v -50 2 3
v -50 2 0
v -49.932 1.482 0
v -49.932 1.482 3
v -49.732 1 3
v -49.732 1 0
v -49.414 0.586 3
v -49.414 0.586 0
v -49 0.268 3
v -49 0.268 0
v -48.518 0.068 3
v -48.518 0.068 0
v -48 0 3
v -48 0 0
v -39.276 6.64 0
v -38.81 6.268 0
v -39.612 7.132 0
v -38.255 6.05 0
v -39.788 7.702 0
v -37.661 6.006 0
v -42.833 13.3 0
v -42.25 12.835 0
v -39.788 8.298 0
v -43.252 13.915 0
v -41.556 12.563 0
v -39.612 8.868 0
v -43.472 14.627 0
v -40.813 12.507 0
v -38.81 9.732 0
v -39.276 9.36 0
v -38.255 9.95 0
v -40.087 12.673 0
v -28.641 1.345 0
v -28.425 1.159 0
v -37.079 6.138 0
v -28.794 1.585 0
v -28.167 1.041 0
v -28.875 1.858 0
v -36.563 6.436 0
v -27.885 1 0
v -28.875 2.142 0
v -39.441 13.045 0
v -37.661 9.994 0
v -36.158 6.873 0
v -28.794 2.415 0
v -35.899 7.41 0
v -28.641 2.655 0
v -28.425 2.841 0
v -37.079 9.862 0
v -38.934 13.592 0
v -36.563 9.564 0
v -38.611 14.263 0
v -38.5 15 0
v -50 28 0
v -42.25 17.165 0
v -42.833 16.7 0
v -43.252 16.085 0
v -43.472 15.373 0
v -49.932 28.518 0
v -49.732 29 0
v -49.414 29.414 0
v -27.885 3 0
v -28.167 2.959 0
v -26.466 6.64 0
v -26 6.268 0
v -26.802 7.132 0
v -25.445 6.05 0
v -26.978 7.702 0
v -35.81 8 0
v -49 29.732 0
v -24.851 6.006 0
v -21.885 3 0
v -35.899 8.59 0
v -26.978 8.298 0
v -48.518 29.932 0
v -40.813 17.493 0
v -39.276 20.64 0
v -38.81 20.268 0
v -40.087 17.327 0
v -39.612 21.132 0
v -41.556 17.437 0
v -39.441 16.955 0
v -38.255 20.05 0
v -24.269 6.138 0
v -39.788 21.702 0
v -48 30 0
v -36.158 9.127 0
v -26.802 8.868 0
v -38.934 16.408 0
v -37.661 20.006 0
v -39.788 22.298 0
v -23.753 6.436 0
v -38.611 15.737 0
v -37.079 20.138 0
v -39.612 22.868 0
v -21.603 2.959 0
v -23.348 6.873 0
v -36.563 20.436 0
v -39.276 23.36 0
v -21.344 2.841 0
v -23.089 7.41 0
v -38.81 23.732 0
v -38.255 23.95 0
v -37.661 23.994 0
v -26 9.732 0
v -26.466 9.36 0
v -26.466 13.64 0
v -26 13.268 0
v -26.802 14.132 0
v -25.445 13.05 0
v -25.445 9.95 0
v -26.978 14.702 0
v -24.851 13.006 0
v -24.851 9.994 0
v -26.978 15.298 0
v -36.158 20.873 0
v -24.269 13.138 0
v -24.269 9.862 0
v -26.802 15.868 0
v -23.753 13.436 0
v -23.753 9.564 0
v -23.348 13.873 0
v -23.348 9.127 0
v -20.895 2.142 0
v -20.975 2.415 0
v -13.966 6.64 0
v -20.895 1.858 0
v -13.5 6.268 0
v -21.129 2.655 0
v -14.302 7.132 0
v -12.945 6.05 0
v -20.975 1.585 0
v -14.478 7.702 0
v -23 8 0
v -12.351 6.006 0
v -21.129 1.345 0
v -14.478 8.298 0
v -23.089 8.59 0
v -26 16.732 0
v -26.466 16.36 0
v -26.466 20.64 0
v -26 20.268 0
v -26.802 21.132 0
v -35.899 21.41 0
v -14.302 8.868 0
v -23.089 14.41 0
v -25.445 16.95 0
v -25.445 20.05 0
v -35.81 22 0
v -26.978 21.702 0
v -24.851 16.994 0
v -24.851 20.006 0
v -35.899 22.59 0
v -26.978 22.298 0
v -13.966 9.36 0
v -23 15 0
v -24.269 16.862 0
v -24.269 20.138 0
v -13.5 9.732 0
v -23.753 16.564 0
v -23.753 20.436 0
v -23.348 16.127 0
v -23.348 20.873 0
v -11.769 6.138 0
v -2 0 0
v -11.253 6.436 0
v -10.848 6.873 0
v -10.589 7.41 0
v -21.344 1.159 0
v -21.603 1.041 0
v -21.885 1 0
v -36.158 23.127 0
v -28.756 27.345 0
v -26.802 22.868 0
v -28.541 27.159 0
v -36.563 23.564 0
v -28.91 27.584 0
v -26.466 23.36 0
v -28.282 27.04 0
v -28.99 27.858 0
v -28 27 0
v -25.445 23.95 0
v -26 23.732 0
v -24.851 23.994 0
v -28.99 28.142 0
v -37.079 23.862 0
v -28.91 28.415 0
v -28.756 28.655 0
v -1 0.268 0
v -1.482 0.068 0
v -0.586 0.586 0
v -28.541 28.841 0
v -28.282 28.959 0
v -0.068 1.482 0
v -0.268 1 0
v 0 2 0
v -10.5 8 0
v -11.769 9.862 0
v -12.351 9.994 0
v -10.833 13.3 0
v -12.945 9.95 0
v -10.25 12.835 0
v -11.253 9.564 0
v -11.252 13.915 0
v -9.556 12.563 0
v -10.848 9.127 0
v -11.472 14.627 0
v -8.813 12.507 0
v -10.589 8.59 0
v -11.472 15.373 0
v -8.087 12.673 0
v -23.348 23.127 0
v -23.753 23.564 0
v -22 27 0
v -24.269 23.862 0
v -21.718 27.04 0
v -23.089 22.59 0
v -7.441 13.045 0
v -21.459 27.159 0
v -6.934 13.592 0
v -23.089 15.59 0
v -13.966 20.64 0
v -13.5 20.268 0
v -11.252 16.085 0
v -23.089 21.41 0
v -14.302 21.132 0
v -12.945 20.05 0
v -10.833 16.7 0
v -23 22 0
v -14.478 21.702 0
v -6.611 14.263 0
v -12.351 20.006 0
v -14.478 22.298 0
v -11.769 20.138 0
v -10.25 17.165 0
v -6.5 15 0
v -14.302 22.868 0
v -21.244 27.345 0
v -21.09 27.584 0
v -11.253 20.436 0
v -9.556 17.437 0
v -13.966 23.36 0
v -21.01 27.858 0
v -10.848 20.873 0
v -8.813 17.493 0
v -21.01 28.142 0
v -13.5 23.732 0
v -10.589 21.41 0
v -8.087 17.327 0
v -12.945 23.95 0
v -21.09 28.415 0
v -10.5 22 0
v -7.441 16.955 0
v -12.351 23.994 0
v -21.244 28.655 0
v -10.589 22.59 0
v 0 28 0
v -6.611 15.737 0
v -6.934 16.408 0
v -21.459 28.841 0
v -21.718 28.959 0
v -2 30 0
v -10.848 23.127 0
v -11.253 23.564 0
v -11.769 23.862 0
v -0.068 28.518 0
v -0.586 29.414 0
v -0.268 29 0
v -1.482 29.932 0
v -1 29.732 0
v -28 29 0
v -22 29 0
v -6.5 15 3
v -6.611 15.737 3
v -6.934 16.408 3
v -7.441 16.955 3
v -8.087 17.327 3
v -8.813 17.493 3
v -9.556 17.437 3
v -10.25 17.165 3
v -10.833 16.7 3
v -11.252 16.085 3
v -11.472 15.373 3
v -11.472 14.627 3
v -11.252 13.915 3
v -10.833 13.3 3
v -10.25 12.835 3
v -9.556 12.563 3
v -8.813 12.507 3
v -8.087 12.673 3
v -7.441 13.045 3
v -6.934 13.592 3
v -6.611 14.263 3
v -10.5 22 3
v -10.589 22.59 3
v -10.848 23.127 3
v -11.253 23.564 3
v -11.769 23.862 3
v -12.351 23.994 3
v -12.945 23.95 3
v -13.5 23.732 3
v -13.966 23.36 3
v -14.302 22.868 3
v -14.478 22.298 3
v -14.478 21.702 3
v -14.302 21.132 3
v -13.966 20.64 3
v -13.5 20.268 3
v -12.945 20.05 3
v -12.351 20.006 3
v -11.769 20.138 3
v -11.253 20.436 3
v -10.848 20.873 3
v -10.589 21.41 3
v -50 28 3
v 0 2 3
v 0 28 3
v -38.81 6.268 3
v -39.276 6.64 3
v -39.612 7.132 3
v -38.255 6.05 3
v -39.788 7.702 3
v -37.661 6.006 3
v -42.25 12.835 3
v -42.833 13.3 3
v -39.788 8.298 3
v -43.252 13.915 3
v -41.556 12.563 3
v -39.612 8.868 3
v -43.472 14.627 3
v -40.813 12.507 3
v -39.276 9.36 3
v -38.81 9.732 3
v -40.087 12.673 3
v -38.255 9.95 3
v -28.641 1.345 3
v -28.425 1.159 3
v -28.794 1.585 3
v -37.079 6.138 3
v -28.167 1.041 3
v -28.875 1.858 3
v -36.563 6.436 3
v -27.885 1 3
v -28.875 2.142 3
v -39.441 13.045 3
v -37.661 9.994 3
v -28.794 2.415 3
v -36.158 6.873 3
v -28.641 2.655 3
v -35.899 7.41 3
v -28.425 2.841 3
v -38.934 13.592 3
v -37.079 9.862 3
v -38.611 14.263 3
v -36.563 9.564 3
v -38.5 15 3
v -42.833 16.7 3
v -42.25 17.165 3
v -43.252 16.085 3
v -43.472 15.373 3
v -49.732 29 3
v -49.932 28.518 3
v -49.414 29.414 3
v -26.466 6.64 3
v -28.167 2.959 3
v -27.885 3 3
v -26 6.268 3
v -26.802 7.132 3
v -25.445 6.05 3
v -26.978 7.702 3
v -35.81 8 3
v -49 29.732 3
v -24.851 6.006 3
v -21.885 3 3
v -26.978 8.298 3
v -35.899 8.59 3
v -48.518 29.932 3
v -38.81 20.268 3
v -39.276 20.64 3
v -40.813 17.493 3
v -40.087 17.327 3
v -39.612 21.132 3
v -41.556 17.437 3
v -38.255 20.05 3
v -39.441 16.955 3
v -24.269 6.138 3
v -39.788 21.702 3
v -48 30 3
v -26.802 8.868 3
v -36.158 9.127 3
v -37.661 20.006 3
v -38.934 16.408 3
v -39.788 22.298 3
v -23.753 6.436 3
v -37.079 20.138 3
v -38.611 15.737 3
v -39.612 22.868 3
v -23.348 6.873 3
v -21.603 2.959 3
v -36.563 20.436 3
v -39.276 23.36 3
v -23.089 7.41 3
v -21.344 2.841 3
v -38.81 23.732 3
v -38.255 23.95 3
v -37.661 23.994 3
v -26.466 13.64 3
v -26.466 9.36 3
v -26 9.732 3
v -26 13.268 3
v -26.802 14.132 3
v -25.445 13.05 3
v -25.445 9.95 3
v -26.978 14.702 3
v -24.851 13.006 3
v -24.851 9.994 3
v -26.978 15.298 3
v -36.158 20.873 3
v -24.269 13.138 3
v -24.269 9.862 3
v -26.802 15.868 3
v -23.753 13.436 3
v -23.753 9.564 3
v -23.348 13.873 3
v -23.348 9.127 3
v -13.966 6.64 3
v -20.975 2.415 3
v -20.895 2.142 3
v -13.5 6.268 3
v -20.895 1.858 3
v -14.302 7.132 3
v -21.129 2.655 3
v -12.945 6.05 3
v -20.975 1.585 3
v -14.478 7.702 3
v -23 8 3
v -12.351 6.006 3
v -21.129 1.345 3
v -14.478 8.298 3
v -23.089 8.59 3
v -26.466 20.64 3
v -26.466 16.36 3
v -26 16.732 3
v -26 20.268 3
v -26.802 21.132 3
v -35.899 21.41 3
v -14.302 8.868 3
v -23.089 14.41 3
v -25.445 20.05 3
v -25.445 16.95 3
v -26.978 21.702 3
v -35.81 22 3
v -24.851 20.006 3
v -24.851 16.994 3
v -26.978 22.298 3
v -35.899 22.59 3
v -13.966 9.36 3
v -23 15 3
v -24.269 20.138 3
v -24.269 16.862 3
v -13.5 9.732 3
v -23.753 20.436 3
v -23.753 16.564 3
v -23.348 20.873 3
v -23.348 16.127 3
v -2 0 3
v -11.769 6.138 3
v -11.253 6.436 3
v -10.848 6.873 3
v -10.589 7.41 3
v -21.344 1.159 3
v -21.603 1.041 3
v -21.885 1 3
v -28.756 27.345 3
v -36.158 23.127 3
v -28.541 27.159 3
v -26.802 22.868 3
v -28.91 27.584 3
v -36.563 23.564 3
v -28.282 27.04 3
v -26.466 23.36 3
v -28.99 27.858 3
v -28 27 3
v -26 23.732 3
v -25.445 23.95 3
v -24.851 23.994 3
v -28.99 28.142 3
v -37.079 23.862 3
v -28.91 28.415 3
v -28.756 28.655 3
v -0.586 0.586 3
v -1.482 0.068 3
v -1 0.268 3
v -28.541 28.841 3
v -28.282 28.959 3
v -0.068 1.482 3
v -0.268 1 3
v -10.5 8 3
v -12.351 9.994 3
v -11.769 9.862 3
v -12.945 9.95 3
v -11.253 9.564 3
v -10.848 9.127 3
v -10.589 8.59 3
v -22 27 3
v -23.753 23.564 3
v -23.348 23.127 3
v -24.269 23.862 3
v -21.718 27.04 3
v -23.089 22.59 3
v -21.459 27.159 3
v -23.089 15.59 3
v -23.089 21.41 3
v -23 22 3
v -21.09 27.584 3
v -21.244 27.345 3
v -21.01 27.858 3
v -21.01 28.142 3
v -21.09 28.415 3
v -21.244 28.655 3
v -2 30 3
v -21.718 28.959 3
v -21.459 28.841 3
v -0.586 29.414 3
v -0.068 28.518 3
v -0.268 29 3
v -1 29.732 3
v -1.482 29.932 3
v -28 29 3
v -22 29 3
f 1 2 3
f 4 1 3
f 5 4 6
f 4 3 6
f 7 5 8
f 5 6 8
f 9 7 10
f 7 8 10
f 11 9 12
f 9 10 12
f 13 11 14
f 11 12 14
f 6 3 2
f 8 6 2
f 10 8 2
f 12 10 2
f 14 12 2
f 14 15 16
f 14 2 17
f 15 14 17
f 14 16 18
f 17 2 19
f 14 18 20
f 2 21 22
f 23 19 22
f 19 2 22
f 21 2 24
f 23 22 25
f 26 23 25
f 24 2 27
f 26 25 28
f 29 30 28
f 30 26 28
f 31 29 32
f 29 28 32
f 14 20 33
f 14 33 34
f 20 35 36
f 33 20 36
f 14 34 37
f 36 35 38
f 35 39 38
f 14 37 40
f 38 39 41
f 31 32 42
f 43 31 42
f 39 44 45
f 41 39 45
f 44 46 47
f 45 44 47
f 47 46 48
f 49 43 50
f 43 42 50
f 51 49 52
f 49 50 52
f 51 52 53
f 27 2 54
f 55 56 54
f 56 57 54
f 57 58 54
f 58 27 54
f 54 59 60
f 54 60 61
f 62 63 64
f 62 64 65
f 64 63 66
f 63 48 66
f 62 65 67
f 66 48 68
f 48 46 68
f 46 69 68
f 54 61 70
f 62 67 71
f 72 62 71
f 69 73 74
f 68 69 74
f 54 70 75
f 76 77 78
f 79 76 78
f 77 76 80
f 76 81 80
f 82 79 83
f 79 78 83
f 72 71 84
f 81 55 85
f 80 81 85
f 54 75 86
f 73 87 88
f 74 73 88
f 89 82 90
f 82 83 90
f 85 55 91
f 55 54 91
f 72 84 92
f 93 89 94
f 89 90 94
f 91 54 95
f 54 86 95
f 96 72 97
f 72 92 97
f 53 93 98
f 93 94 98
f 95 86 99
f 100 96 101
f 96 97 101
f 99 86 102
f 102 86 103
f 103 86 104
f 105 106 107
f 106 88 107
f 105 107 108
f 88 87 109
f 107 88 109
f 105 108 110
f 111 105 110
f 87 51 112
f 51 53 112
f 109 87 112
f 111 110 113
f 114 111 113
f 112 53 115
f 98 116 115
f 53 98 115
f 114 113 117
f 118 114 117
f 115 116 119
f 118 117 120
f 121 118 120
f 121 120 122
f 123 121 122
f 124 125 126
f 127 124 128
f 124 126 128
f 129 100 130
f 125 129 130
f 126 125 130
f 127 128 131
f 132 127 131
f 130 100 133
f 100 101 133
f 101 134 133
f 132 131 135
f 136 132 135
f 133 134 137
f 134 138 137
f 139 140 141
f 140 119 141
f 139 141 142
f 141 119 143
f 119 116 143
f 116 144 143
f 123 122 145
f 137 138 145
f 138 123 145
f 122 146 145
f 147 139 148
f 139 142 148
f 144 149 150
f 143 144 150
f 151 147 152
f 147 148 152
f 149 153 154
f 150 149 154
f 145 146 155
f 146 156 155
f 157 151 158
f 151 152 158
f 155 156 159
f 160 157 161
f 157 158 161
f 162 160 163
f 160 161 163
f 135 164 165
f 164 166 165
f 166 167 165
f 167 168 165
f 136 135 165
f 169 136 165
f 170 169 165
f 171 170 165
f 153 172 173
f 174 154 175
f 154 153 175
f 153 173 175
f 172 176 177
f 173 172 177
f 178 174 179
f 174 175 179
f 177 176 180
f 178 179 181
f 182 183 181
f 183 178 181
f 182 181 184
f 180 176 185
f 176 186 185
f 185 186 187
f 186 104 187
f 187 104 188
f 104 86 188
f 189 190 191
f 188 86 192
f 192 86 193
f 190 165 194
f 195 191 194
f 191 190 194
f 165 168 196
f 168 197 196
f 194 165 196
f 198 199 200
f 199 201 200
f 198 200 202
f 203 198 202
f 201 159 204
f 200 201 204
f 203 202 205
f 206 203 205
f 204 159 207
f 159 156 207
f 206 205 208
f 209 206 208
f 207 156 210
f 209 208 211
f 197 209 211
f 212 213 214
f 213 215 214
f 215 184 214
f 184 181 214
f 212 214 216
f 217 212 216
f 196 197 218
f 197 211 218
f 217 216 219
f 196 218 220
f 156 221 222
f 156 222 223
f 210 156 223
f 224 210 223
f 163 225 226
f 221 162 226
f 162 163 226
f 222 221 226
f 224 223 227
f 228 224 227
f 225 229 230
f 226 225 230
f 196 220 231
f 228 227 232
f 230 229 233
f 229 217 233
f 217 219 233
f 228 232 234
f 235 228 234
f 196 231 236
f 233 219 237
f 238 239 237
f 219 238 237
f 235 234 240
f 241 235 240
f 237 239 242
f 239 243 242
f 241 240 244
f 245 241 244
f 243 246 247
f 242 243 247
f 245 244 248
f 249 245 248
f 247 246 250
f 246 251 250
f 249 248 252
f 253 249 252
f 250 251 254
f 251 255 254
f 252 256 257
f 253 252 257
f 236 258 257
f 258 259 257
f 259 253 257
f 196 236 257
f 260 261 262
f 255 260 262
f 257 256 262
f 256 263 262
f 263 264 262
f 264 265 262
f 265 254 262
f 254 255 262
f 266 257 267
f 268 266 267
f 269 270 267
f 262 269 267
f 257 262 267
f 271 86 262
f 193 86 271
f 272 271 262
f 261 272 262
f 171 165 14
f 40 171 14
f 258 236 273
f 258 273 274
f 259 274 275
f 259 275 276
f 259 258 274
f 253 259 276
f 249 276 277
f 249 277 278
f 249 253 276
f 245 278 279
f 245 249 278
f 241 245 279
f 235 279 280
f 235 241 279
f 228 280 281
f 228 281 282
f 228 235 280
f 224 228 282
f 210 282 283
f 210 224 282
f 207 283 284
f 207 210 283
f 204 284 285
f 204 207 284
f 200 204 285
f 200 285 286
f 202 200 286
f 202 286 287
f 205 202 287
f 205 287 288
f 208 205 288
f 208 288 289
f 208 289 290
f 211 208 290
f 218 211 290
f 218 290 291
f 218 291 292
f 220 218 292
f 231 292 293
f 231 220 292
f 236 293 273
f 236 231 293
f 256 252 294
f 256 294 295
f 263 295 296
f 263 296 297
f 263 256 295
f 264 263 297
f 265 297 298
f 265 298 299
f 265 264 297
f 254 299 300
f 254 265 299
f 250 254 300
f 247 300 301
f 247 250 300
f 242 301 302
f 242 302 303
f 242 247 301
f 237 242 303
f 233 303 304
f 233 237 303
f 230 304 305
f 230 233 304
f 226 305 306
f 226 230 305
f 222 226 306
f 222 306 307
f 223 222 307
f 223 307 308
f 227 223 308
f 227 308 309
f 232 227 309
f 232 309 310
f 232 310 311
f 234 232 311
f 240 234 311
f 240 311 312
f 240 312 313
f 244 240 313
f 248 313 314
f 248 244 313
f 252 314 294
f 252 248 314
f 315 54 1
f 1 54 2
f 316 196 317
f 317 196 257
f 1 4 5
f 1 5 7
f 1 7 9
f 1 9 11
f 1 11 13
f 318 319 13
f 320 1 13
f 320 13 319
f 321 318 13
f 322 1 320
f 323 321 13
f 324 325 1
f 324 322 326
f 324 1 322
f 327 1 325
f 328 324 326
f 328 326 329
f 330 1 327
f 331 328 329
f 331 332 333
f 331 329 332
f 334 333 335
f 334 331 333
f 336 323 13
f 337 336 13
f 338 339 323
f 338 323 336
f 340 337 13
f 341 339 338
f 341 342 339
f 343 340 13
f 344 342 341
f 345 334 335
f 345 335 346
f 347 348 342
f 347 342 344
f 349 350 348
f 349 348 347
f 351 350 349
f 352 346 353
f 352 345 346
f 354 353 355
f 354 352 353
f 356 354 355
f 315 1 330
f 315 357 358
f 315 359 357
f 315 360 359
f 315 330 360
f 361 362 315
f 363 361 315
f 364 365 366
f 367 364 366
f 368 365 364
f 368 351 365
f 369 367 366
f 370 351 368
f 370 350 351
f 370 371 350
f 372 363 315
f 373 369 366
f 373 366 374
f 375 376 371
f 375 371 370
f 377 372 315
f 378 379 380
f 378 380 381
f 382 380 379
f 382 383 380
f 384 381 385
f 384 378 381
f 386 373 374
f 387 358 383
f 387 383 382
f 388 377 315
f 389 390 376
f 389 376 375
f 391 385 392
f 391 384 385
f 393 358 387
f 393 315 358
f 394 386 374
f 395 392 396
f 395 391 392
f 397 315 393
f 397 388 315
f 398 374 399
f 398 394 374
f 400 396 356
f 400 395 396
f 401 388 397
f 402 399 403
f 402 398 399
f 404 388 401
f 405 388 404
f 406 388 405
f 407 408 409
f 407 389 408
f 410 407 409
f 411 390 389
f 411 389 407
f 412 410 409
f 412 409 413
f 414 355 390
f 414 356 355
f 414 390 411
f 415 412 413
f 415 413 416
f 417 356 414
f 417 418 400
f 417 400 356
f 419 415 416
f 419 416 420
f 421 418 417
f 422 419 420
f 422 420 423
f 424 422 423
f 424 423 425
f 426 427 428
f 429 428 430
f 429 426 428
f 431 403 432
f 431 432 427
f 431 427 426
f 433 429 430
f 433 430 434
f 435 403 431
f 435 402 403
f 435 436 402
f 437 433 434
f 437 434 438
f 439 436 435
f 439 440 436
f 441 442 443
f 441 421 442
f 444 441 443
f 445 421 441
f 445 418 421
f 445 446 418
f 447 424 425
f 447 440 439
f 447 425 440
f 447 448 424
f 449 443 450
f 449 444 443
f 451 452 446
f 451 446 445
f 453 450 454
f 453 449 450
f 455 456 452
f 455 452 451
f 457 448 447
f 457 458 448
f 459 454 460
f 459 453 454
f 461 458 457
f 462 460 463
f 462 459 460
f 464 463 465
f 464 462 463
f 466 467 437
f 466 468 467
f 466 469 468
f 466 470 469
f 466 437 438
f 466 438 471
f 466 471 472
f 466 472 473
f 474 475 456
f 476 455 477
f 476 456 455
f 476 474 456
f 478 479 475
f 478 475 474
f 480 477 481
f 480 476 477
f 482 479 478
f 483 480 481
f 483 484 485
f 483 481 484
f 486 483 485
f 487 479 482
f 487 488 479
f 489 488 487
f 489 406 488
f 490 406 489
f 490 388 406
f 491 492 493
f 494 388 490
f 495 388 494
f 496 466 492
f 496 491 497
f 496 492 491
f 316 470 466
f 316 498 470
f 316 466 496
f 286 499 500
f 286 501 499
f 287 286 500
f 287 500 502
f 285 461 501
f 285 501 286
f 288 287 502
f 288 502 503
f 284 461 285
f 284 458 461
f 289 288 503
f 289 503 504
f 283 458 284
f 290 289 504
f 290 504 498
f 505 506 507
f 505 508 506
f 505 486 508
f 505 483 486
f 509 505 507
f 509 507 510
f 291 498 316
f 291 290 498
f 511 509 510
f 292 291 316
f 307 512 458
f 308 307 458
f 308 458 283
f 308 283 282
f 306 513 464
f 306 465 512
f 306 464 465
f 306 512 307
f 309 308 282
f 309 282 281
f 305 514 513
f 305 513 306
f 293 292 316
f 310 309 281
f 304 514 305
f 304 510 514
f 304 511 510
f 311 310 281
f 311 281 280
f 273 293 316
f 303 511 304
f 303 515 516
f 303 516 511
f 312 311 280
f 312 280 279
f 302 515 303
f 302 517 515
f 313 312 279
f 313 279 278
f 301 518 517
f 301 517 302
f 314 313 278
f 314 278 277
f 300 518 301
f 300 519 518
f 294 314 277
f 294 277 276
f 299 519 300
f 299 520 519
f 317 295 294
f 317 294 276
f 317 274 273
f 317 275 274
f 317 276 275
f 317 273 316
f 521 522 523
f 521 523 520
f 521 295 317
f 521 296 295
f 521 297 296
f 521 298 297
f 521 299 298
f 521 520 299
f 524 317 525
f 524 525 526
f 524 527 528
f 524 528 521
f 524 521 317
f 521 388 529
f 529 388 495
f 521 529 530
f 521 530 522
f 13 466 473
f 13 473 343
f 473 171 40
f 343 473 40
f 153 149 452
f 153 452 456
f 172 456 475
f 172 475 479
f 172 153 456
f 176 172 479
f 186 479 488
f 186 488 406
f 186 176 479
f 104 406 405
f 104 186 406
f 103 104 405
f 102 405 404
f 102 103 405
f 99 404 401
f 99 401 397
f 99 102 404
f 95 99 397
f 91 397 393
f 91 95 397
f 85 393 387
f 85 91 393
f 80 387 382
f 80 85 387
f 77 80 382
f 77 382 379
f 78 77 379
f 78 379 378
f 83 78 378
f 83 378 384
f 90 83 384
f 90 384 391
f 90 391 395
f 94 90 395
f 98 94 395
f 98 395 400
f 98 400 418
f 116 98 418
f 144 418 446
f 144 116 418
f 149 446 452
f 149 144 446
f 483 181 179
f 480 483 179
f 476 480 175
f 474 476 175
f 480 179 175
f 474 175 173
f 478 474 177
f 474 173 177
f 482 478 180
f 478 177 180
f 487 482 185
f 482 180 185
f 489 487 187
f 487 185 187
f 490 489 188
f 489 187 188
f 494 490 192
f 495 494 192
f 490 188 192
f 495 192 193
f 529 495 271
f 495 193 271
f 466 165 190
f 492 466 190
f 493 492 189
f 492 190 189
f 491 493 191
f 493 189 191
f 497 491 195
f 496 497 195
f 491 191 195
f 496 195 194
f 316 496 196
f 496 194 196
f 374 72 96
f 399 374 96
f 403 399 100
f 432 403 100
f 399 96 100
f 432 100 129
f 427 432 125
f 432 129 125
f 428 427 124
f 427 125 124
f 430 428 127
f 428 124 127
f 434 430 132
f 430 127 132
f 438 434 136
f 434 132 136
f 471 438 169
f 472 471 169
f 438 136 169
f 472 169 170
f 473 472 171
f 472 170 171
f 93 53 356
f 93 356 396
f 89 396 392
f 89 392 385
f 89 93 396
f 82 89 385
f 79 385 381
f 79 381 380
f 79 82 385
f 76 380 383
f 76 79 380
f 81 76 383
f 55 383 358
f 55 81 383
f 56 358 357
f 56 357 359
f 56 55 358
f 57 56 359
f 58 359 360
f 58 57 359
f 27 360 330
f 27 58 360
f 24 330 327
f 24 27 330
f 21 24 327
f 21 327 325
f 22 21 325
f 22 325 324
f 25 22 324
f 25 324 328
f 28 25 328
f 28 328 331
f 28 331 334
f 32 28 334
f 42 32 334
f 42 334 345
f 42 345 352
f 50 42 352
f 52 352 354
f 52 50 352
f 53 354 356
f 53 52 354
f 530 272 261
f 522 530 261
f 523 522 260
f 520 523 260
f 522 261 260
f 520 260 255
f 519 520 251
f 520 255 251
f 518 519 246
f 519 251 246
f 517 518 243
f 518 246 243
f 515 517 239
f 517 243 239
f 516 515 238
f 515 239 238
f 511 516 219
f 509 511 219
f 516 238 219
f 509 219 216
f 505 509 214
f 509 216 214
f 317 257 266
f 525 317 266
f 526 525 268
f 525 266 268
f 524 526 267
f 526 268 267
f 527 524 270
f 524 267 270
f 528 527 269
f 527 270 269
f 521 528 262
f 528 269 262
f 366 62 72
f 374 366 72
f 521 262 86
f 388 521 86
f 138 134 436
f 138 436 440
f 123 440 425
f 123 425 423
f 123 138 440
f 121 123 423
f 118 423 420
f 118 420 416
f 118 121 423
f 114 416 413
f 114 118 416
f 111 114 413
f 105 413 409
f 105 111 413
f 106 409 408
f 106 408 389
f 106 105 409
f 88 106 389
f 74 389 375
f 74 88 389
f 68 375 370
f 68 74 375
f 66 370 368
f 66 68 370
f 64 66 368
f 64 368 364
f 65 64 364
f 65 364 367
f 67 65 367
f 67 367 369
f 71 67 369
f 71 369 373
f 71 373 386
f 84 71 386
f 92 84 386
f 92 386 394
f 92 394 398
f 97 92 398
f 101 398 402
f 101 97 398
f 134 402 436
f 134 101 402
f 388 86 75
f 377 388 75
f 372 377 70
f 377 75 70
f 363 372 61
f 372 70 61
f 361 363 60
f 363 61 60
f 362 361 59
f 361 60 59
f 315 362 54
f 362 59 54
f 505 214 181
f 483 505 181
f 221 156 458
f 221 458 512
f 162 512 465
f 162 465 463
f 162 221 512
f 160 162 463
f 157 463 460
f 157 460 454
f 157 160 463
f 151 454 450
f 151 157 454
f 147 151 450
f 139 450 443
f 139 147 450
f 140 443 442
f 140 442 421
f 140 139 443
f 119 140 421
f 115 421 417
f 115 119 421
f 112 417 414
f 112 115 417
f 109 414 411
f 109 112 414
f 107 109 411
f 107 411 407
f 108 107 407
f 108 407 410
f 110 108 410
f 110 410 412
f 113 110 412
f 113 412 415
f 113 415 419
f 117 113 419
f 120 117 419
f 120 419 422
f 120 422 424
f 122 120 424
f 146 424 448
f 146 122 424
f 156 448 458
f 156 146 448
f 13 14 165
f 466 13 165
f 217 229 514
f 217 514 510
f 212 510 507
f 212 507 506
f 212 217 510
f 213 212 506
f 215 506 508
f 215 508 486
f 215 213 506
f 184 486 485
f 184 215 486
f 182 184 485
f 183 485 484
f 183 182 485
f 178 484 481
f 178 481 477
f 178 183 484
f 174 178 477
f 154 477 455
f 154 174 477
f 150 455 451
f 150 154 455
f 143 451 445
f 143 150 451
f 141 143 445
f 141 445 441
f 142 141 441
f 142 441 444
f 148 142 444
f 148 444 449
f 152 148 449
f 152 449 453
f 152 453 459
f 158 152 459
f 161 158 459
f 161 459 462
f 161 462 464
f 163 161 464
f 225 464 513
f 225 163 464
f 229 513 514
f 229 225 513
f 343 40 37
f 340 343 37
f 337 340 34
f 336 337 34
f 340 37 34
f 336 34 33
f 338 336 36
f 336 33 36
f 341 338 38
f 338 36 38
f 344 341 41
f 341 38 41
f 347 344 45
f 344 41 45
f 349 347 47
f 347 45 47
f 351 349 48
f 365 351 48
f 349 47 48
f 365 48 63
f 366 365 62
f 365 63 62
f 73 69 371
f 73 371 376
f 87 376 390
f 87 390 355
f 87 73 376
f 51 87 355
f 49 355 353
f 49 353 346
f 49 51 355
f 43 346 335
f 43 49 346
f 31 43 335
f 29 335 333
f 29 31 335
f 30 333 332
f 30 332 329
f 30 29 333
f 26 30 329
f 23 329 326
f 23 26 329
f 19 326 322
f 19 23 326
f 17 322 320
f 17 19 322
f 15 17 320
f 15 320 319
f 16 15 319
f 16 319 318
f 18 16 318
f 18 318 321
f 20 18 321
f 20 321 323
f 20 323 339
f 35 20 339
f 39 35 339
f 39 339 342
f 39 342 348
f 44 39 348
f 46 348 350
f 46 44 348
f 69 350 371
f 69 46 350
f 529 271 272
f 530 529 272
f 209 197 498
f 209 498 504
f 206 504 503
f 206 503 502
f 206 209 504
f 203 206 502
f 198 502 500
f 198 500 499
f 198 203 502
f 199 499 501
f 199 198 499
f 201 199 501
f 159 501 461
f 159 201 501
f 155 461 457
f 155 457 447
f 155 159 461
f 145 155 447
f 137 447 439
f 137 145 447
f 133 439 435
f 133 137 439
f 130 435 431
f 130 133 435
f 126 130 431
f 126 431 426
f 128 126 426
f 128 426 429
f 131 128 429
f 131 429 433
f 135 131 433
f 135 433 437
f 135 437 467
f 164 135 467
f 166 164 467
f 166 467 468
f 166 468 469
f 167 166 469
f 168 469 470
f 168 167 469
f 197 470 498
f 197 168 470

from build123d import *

# Parameters (mm, degrees)
MODEL_R             = 2
MODEL_R_2           = 2.5
BOSS_EXTRUDE1_DEPTH = 3


with BuildPart() as part:
    # Model → Boss-Extrude1 (new body)
    with BuildSketch(Plane.XY):
        with BuildLine():
            Line((-2, 30), (-48, 30))
            ThreePointArc((-48, 30), (-49.414213562, 29.414213562), (-50, 28))
            Line((-50, 28), (-50, 2))
            ThreePointArc((-50, 2), (-49.414213562, 0.585786438), (-48, 0))
            Line((-48, 0), (-2, 0))
            ThreePointArc((-2, 0), (-0.585786438, 0.585786438), (0, 2))
            Line((0, 2), (0, 28))
            ThreePointArc((0, 28), (-0.585786438, 29.414213562), (-2, 30))
        make_face()
        with Locations((-25, 15)):
            Circle(MODEL_R, mode=Mode.SUBTRACT)
        with Locations((-37.81005651, 8)):
            Circle(MODEL_R, mode=Mode.SUBTRACT)
        with Locations((-12.5, 8)):
            Circle(MODEL_R, mode=Mode.SUBTRACT)
        with Locations((-37.81005651, 22)):
            Circle(MODEL_R, mode=Mode.SUBTRACT)
        with Locations((-12.5, 22)):
            Circle(MODEL_R, mode=Mode.SUBTRACT)
        with Locations((-25, 8)):
            Circle(MODEL_R, mode=Mode.SUBTRACT)
        with Locations((-25, 22)):
            Circle(MODEL_R, mode=Mode.SUBTRACT)
        with Locations((-9, 15)):
            Circle(MODEL_R_2, mode=Mode.SUBTRACT)
        with Locations((-41, 15)):
            Circle(MODEL_R_2, mode=Mode.SUBTRACT)
        with BuildLine():
            Line((-21.884771632, 1), (-27.884771632, 1))
            ThreePointArc((-27.884771632, 1), (-28.884771632, 2), (-27.884771632, 3))
            Line((-27.884771632, 3), (-21.884771632, 3))
            ThreePointArc((-21.884771632, 3), (-20.884771632, 2), (-21.884771632, 1))
        make_face(mode=Mode.SUBTRACT)
        with BuildLine():
            Line((-28, 28.999828109), (-22, 28.999828109))
            ThreePointArc((-22, 28.999828109), (-21, 27.999828109), (-22, 26.999828109))
            Line((-22, 26.999828109), (-28, 26.999828109))
            ThreePointArc((-28, 26.999828109), (-29, 27.999828109), (-28, 28.999828109))
        make_face(mode=Mode.SUBTRACT)
    extrude(amount=BOSS_EXTRUDE1_DEPTH)


solid = part.part
